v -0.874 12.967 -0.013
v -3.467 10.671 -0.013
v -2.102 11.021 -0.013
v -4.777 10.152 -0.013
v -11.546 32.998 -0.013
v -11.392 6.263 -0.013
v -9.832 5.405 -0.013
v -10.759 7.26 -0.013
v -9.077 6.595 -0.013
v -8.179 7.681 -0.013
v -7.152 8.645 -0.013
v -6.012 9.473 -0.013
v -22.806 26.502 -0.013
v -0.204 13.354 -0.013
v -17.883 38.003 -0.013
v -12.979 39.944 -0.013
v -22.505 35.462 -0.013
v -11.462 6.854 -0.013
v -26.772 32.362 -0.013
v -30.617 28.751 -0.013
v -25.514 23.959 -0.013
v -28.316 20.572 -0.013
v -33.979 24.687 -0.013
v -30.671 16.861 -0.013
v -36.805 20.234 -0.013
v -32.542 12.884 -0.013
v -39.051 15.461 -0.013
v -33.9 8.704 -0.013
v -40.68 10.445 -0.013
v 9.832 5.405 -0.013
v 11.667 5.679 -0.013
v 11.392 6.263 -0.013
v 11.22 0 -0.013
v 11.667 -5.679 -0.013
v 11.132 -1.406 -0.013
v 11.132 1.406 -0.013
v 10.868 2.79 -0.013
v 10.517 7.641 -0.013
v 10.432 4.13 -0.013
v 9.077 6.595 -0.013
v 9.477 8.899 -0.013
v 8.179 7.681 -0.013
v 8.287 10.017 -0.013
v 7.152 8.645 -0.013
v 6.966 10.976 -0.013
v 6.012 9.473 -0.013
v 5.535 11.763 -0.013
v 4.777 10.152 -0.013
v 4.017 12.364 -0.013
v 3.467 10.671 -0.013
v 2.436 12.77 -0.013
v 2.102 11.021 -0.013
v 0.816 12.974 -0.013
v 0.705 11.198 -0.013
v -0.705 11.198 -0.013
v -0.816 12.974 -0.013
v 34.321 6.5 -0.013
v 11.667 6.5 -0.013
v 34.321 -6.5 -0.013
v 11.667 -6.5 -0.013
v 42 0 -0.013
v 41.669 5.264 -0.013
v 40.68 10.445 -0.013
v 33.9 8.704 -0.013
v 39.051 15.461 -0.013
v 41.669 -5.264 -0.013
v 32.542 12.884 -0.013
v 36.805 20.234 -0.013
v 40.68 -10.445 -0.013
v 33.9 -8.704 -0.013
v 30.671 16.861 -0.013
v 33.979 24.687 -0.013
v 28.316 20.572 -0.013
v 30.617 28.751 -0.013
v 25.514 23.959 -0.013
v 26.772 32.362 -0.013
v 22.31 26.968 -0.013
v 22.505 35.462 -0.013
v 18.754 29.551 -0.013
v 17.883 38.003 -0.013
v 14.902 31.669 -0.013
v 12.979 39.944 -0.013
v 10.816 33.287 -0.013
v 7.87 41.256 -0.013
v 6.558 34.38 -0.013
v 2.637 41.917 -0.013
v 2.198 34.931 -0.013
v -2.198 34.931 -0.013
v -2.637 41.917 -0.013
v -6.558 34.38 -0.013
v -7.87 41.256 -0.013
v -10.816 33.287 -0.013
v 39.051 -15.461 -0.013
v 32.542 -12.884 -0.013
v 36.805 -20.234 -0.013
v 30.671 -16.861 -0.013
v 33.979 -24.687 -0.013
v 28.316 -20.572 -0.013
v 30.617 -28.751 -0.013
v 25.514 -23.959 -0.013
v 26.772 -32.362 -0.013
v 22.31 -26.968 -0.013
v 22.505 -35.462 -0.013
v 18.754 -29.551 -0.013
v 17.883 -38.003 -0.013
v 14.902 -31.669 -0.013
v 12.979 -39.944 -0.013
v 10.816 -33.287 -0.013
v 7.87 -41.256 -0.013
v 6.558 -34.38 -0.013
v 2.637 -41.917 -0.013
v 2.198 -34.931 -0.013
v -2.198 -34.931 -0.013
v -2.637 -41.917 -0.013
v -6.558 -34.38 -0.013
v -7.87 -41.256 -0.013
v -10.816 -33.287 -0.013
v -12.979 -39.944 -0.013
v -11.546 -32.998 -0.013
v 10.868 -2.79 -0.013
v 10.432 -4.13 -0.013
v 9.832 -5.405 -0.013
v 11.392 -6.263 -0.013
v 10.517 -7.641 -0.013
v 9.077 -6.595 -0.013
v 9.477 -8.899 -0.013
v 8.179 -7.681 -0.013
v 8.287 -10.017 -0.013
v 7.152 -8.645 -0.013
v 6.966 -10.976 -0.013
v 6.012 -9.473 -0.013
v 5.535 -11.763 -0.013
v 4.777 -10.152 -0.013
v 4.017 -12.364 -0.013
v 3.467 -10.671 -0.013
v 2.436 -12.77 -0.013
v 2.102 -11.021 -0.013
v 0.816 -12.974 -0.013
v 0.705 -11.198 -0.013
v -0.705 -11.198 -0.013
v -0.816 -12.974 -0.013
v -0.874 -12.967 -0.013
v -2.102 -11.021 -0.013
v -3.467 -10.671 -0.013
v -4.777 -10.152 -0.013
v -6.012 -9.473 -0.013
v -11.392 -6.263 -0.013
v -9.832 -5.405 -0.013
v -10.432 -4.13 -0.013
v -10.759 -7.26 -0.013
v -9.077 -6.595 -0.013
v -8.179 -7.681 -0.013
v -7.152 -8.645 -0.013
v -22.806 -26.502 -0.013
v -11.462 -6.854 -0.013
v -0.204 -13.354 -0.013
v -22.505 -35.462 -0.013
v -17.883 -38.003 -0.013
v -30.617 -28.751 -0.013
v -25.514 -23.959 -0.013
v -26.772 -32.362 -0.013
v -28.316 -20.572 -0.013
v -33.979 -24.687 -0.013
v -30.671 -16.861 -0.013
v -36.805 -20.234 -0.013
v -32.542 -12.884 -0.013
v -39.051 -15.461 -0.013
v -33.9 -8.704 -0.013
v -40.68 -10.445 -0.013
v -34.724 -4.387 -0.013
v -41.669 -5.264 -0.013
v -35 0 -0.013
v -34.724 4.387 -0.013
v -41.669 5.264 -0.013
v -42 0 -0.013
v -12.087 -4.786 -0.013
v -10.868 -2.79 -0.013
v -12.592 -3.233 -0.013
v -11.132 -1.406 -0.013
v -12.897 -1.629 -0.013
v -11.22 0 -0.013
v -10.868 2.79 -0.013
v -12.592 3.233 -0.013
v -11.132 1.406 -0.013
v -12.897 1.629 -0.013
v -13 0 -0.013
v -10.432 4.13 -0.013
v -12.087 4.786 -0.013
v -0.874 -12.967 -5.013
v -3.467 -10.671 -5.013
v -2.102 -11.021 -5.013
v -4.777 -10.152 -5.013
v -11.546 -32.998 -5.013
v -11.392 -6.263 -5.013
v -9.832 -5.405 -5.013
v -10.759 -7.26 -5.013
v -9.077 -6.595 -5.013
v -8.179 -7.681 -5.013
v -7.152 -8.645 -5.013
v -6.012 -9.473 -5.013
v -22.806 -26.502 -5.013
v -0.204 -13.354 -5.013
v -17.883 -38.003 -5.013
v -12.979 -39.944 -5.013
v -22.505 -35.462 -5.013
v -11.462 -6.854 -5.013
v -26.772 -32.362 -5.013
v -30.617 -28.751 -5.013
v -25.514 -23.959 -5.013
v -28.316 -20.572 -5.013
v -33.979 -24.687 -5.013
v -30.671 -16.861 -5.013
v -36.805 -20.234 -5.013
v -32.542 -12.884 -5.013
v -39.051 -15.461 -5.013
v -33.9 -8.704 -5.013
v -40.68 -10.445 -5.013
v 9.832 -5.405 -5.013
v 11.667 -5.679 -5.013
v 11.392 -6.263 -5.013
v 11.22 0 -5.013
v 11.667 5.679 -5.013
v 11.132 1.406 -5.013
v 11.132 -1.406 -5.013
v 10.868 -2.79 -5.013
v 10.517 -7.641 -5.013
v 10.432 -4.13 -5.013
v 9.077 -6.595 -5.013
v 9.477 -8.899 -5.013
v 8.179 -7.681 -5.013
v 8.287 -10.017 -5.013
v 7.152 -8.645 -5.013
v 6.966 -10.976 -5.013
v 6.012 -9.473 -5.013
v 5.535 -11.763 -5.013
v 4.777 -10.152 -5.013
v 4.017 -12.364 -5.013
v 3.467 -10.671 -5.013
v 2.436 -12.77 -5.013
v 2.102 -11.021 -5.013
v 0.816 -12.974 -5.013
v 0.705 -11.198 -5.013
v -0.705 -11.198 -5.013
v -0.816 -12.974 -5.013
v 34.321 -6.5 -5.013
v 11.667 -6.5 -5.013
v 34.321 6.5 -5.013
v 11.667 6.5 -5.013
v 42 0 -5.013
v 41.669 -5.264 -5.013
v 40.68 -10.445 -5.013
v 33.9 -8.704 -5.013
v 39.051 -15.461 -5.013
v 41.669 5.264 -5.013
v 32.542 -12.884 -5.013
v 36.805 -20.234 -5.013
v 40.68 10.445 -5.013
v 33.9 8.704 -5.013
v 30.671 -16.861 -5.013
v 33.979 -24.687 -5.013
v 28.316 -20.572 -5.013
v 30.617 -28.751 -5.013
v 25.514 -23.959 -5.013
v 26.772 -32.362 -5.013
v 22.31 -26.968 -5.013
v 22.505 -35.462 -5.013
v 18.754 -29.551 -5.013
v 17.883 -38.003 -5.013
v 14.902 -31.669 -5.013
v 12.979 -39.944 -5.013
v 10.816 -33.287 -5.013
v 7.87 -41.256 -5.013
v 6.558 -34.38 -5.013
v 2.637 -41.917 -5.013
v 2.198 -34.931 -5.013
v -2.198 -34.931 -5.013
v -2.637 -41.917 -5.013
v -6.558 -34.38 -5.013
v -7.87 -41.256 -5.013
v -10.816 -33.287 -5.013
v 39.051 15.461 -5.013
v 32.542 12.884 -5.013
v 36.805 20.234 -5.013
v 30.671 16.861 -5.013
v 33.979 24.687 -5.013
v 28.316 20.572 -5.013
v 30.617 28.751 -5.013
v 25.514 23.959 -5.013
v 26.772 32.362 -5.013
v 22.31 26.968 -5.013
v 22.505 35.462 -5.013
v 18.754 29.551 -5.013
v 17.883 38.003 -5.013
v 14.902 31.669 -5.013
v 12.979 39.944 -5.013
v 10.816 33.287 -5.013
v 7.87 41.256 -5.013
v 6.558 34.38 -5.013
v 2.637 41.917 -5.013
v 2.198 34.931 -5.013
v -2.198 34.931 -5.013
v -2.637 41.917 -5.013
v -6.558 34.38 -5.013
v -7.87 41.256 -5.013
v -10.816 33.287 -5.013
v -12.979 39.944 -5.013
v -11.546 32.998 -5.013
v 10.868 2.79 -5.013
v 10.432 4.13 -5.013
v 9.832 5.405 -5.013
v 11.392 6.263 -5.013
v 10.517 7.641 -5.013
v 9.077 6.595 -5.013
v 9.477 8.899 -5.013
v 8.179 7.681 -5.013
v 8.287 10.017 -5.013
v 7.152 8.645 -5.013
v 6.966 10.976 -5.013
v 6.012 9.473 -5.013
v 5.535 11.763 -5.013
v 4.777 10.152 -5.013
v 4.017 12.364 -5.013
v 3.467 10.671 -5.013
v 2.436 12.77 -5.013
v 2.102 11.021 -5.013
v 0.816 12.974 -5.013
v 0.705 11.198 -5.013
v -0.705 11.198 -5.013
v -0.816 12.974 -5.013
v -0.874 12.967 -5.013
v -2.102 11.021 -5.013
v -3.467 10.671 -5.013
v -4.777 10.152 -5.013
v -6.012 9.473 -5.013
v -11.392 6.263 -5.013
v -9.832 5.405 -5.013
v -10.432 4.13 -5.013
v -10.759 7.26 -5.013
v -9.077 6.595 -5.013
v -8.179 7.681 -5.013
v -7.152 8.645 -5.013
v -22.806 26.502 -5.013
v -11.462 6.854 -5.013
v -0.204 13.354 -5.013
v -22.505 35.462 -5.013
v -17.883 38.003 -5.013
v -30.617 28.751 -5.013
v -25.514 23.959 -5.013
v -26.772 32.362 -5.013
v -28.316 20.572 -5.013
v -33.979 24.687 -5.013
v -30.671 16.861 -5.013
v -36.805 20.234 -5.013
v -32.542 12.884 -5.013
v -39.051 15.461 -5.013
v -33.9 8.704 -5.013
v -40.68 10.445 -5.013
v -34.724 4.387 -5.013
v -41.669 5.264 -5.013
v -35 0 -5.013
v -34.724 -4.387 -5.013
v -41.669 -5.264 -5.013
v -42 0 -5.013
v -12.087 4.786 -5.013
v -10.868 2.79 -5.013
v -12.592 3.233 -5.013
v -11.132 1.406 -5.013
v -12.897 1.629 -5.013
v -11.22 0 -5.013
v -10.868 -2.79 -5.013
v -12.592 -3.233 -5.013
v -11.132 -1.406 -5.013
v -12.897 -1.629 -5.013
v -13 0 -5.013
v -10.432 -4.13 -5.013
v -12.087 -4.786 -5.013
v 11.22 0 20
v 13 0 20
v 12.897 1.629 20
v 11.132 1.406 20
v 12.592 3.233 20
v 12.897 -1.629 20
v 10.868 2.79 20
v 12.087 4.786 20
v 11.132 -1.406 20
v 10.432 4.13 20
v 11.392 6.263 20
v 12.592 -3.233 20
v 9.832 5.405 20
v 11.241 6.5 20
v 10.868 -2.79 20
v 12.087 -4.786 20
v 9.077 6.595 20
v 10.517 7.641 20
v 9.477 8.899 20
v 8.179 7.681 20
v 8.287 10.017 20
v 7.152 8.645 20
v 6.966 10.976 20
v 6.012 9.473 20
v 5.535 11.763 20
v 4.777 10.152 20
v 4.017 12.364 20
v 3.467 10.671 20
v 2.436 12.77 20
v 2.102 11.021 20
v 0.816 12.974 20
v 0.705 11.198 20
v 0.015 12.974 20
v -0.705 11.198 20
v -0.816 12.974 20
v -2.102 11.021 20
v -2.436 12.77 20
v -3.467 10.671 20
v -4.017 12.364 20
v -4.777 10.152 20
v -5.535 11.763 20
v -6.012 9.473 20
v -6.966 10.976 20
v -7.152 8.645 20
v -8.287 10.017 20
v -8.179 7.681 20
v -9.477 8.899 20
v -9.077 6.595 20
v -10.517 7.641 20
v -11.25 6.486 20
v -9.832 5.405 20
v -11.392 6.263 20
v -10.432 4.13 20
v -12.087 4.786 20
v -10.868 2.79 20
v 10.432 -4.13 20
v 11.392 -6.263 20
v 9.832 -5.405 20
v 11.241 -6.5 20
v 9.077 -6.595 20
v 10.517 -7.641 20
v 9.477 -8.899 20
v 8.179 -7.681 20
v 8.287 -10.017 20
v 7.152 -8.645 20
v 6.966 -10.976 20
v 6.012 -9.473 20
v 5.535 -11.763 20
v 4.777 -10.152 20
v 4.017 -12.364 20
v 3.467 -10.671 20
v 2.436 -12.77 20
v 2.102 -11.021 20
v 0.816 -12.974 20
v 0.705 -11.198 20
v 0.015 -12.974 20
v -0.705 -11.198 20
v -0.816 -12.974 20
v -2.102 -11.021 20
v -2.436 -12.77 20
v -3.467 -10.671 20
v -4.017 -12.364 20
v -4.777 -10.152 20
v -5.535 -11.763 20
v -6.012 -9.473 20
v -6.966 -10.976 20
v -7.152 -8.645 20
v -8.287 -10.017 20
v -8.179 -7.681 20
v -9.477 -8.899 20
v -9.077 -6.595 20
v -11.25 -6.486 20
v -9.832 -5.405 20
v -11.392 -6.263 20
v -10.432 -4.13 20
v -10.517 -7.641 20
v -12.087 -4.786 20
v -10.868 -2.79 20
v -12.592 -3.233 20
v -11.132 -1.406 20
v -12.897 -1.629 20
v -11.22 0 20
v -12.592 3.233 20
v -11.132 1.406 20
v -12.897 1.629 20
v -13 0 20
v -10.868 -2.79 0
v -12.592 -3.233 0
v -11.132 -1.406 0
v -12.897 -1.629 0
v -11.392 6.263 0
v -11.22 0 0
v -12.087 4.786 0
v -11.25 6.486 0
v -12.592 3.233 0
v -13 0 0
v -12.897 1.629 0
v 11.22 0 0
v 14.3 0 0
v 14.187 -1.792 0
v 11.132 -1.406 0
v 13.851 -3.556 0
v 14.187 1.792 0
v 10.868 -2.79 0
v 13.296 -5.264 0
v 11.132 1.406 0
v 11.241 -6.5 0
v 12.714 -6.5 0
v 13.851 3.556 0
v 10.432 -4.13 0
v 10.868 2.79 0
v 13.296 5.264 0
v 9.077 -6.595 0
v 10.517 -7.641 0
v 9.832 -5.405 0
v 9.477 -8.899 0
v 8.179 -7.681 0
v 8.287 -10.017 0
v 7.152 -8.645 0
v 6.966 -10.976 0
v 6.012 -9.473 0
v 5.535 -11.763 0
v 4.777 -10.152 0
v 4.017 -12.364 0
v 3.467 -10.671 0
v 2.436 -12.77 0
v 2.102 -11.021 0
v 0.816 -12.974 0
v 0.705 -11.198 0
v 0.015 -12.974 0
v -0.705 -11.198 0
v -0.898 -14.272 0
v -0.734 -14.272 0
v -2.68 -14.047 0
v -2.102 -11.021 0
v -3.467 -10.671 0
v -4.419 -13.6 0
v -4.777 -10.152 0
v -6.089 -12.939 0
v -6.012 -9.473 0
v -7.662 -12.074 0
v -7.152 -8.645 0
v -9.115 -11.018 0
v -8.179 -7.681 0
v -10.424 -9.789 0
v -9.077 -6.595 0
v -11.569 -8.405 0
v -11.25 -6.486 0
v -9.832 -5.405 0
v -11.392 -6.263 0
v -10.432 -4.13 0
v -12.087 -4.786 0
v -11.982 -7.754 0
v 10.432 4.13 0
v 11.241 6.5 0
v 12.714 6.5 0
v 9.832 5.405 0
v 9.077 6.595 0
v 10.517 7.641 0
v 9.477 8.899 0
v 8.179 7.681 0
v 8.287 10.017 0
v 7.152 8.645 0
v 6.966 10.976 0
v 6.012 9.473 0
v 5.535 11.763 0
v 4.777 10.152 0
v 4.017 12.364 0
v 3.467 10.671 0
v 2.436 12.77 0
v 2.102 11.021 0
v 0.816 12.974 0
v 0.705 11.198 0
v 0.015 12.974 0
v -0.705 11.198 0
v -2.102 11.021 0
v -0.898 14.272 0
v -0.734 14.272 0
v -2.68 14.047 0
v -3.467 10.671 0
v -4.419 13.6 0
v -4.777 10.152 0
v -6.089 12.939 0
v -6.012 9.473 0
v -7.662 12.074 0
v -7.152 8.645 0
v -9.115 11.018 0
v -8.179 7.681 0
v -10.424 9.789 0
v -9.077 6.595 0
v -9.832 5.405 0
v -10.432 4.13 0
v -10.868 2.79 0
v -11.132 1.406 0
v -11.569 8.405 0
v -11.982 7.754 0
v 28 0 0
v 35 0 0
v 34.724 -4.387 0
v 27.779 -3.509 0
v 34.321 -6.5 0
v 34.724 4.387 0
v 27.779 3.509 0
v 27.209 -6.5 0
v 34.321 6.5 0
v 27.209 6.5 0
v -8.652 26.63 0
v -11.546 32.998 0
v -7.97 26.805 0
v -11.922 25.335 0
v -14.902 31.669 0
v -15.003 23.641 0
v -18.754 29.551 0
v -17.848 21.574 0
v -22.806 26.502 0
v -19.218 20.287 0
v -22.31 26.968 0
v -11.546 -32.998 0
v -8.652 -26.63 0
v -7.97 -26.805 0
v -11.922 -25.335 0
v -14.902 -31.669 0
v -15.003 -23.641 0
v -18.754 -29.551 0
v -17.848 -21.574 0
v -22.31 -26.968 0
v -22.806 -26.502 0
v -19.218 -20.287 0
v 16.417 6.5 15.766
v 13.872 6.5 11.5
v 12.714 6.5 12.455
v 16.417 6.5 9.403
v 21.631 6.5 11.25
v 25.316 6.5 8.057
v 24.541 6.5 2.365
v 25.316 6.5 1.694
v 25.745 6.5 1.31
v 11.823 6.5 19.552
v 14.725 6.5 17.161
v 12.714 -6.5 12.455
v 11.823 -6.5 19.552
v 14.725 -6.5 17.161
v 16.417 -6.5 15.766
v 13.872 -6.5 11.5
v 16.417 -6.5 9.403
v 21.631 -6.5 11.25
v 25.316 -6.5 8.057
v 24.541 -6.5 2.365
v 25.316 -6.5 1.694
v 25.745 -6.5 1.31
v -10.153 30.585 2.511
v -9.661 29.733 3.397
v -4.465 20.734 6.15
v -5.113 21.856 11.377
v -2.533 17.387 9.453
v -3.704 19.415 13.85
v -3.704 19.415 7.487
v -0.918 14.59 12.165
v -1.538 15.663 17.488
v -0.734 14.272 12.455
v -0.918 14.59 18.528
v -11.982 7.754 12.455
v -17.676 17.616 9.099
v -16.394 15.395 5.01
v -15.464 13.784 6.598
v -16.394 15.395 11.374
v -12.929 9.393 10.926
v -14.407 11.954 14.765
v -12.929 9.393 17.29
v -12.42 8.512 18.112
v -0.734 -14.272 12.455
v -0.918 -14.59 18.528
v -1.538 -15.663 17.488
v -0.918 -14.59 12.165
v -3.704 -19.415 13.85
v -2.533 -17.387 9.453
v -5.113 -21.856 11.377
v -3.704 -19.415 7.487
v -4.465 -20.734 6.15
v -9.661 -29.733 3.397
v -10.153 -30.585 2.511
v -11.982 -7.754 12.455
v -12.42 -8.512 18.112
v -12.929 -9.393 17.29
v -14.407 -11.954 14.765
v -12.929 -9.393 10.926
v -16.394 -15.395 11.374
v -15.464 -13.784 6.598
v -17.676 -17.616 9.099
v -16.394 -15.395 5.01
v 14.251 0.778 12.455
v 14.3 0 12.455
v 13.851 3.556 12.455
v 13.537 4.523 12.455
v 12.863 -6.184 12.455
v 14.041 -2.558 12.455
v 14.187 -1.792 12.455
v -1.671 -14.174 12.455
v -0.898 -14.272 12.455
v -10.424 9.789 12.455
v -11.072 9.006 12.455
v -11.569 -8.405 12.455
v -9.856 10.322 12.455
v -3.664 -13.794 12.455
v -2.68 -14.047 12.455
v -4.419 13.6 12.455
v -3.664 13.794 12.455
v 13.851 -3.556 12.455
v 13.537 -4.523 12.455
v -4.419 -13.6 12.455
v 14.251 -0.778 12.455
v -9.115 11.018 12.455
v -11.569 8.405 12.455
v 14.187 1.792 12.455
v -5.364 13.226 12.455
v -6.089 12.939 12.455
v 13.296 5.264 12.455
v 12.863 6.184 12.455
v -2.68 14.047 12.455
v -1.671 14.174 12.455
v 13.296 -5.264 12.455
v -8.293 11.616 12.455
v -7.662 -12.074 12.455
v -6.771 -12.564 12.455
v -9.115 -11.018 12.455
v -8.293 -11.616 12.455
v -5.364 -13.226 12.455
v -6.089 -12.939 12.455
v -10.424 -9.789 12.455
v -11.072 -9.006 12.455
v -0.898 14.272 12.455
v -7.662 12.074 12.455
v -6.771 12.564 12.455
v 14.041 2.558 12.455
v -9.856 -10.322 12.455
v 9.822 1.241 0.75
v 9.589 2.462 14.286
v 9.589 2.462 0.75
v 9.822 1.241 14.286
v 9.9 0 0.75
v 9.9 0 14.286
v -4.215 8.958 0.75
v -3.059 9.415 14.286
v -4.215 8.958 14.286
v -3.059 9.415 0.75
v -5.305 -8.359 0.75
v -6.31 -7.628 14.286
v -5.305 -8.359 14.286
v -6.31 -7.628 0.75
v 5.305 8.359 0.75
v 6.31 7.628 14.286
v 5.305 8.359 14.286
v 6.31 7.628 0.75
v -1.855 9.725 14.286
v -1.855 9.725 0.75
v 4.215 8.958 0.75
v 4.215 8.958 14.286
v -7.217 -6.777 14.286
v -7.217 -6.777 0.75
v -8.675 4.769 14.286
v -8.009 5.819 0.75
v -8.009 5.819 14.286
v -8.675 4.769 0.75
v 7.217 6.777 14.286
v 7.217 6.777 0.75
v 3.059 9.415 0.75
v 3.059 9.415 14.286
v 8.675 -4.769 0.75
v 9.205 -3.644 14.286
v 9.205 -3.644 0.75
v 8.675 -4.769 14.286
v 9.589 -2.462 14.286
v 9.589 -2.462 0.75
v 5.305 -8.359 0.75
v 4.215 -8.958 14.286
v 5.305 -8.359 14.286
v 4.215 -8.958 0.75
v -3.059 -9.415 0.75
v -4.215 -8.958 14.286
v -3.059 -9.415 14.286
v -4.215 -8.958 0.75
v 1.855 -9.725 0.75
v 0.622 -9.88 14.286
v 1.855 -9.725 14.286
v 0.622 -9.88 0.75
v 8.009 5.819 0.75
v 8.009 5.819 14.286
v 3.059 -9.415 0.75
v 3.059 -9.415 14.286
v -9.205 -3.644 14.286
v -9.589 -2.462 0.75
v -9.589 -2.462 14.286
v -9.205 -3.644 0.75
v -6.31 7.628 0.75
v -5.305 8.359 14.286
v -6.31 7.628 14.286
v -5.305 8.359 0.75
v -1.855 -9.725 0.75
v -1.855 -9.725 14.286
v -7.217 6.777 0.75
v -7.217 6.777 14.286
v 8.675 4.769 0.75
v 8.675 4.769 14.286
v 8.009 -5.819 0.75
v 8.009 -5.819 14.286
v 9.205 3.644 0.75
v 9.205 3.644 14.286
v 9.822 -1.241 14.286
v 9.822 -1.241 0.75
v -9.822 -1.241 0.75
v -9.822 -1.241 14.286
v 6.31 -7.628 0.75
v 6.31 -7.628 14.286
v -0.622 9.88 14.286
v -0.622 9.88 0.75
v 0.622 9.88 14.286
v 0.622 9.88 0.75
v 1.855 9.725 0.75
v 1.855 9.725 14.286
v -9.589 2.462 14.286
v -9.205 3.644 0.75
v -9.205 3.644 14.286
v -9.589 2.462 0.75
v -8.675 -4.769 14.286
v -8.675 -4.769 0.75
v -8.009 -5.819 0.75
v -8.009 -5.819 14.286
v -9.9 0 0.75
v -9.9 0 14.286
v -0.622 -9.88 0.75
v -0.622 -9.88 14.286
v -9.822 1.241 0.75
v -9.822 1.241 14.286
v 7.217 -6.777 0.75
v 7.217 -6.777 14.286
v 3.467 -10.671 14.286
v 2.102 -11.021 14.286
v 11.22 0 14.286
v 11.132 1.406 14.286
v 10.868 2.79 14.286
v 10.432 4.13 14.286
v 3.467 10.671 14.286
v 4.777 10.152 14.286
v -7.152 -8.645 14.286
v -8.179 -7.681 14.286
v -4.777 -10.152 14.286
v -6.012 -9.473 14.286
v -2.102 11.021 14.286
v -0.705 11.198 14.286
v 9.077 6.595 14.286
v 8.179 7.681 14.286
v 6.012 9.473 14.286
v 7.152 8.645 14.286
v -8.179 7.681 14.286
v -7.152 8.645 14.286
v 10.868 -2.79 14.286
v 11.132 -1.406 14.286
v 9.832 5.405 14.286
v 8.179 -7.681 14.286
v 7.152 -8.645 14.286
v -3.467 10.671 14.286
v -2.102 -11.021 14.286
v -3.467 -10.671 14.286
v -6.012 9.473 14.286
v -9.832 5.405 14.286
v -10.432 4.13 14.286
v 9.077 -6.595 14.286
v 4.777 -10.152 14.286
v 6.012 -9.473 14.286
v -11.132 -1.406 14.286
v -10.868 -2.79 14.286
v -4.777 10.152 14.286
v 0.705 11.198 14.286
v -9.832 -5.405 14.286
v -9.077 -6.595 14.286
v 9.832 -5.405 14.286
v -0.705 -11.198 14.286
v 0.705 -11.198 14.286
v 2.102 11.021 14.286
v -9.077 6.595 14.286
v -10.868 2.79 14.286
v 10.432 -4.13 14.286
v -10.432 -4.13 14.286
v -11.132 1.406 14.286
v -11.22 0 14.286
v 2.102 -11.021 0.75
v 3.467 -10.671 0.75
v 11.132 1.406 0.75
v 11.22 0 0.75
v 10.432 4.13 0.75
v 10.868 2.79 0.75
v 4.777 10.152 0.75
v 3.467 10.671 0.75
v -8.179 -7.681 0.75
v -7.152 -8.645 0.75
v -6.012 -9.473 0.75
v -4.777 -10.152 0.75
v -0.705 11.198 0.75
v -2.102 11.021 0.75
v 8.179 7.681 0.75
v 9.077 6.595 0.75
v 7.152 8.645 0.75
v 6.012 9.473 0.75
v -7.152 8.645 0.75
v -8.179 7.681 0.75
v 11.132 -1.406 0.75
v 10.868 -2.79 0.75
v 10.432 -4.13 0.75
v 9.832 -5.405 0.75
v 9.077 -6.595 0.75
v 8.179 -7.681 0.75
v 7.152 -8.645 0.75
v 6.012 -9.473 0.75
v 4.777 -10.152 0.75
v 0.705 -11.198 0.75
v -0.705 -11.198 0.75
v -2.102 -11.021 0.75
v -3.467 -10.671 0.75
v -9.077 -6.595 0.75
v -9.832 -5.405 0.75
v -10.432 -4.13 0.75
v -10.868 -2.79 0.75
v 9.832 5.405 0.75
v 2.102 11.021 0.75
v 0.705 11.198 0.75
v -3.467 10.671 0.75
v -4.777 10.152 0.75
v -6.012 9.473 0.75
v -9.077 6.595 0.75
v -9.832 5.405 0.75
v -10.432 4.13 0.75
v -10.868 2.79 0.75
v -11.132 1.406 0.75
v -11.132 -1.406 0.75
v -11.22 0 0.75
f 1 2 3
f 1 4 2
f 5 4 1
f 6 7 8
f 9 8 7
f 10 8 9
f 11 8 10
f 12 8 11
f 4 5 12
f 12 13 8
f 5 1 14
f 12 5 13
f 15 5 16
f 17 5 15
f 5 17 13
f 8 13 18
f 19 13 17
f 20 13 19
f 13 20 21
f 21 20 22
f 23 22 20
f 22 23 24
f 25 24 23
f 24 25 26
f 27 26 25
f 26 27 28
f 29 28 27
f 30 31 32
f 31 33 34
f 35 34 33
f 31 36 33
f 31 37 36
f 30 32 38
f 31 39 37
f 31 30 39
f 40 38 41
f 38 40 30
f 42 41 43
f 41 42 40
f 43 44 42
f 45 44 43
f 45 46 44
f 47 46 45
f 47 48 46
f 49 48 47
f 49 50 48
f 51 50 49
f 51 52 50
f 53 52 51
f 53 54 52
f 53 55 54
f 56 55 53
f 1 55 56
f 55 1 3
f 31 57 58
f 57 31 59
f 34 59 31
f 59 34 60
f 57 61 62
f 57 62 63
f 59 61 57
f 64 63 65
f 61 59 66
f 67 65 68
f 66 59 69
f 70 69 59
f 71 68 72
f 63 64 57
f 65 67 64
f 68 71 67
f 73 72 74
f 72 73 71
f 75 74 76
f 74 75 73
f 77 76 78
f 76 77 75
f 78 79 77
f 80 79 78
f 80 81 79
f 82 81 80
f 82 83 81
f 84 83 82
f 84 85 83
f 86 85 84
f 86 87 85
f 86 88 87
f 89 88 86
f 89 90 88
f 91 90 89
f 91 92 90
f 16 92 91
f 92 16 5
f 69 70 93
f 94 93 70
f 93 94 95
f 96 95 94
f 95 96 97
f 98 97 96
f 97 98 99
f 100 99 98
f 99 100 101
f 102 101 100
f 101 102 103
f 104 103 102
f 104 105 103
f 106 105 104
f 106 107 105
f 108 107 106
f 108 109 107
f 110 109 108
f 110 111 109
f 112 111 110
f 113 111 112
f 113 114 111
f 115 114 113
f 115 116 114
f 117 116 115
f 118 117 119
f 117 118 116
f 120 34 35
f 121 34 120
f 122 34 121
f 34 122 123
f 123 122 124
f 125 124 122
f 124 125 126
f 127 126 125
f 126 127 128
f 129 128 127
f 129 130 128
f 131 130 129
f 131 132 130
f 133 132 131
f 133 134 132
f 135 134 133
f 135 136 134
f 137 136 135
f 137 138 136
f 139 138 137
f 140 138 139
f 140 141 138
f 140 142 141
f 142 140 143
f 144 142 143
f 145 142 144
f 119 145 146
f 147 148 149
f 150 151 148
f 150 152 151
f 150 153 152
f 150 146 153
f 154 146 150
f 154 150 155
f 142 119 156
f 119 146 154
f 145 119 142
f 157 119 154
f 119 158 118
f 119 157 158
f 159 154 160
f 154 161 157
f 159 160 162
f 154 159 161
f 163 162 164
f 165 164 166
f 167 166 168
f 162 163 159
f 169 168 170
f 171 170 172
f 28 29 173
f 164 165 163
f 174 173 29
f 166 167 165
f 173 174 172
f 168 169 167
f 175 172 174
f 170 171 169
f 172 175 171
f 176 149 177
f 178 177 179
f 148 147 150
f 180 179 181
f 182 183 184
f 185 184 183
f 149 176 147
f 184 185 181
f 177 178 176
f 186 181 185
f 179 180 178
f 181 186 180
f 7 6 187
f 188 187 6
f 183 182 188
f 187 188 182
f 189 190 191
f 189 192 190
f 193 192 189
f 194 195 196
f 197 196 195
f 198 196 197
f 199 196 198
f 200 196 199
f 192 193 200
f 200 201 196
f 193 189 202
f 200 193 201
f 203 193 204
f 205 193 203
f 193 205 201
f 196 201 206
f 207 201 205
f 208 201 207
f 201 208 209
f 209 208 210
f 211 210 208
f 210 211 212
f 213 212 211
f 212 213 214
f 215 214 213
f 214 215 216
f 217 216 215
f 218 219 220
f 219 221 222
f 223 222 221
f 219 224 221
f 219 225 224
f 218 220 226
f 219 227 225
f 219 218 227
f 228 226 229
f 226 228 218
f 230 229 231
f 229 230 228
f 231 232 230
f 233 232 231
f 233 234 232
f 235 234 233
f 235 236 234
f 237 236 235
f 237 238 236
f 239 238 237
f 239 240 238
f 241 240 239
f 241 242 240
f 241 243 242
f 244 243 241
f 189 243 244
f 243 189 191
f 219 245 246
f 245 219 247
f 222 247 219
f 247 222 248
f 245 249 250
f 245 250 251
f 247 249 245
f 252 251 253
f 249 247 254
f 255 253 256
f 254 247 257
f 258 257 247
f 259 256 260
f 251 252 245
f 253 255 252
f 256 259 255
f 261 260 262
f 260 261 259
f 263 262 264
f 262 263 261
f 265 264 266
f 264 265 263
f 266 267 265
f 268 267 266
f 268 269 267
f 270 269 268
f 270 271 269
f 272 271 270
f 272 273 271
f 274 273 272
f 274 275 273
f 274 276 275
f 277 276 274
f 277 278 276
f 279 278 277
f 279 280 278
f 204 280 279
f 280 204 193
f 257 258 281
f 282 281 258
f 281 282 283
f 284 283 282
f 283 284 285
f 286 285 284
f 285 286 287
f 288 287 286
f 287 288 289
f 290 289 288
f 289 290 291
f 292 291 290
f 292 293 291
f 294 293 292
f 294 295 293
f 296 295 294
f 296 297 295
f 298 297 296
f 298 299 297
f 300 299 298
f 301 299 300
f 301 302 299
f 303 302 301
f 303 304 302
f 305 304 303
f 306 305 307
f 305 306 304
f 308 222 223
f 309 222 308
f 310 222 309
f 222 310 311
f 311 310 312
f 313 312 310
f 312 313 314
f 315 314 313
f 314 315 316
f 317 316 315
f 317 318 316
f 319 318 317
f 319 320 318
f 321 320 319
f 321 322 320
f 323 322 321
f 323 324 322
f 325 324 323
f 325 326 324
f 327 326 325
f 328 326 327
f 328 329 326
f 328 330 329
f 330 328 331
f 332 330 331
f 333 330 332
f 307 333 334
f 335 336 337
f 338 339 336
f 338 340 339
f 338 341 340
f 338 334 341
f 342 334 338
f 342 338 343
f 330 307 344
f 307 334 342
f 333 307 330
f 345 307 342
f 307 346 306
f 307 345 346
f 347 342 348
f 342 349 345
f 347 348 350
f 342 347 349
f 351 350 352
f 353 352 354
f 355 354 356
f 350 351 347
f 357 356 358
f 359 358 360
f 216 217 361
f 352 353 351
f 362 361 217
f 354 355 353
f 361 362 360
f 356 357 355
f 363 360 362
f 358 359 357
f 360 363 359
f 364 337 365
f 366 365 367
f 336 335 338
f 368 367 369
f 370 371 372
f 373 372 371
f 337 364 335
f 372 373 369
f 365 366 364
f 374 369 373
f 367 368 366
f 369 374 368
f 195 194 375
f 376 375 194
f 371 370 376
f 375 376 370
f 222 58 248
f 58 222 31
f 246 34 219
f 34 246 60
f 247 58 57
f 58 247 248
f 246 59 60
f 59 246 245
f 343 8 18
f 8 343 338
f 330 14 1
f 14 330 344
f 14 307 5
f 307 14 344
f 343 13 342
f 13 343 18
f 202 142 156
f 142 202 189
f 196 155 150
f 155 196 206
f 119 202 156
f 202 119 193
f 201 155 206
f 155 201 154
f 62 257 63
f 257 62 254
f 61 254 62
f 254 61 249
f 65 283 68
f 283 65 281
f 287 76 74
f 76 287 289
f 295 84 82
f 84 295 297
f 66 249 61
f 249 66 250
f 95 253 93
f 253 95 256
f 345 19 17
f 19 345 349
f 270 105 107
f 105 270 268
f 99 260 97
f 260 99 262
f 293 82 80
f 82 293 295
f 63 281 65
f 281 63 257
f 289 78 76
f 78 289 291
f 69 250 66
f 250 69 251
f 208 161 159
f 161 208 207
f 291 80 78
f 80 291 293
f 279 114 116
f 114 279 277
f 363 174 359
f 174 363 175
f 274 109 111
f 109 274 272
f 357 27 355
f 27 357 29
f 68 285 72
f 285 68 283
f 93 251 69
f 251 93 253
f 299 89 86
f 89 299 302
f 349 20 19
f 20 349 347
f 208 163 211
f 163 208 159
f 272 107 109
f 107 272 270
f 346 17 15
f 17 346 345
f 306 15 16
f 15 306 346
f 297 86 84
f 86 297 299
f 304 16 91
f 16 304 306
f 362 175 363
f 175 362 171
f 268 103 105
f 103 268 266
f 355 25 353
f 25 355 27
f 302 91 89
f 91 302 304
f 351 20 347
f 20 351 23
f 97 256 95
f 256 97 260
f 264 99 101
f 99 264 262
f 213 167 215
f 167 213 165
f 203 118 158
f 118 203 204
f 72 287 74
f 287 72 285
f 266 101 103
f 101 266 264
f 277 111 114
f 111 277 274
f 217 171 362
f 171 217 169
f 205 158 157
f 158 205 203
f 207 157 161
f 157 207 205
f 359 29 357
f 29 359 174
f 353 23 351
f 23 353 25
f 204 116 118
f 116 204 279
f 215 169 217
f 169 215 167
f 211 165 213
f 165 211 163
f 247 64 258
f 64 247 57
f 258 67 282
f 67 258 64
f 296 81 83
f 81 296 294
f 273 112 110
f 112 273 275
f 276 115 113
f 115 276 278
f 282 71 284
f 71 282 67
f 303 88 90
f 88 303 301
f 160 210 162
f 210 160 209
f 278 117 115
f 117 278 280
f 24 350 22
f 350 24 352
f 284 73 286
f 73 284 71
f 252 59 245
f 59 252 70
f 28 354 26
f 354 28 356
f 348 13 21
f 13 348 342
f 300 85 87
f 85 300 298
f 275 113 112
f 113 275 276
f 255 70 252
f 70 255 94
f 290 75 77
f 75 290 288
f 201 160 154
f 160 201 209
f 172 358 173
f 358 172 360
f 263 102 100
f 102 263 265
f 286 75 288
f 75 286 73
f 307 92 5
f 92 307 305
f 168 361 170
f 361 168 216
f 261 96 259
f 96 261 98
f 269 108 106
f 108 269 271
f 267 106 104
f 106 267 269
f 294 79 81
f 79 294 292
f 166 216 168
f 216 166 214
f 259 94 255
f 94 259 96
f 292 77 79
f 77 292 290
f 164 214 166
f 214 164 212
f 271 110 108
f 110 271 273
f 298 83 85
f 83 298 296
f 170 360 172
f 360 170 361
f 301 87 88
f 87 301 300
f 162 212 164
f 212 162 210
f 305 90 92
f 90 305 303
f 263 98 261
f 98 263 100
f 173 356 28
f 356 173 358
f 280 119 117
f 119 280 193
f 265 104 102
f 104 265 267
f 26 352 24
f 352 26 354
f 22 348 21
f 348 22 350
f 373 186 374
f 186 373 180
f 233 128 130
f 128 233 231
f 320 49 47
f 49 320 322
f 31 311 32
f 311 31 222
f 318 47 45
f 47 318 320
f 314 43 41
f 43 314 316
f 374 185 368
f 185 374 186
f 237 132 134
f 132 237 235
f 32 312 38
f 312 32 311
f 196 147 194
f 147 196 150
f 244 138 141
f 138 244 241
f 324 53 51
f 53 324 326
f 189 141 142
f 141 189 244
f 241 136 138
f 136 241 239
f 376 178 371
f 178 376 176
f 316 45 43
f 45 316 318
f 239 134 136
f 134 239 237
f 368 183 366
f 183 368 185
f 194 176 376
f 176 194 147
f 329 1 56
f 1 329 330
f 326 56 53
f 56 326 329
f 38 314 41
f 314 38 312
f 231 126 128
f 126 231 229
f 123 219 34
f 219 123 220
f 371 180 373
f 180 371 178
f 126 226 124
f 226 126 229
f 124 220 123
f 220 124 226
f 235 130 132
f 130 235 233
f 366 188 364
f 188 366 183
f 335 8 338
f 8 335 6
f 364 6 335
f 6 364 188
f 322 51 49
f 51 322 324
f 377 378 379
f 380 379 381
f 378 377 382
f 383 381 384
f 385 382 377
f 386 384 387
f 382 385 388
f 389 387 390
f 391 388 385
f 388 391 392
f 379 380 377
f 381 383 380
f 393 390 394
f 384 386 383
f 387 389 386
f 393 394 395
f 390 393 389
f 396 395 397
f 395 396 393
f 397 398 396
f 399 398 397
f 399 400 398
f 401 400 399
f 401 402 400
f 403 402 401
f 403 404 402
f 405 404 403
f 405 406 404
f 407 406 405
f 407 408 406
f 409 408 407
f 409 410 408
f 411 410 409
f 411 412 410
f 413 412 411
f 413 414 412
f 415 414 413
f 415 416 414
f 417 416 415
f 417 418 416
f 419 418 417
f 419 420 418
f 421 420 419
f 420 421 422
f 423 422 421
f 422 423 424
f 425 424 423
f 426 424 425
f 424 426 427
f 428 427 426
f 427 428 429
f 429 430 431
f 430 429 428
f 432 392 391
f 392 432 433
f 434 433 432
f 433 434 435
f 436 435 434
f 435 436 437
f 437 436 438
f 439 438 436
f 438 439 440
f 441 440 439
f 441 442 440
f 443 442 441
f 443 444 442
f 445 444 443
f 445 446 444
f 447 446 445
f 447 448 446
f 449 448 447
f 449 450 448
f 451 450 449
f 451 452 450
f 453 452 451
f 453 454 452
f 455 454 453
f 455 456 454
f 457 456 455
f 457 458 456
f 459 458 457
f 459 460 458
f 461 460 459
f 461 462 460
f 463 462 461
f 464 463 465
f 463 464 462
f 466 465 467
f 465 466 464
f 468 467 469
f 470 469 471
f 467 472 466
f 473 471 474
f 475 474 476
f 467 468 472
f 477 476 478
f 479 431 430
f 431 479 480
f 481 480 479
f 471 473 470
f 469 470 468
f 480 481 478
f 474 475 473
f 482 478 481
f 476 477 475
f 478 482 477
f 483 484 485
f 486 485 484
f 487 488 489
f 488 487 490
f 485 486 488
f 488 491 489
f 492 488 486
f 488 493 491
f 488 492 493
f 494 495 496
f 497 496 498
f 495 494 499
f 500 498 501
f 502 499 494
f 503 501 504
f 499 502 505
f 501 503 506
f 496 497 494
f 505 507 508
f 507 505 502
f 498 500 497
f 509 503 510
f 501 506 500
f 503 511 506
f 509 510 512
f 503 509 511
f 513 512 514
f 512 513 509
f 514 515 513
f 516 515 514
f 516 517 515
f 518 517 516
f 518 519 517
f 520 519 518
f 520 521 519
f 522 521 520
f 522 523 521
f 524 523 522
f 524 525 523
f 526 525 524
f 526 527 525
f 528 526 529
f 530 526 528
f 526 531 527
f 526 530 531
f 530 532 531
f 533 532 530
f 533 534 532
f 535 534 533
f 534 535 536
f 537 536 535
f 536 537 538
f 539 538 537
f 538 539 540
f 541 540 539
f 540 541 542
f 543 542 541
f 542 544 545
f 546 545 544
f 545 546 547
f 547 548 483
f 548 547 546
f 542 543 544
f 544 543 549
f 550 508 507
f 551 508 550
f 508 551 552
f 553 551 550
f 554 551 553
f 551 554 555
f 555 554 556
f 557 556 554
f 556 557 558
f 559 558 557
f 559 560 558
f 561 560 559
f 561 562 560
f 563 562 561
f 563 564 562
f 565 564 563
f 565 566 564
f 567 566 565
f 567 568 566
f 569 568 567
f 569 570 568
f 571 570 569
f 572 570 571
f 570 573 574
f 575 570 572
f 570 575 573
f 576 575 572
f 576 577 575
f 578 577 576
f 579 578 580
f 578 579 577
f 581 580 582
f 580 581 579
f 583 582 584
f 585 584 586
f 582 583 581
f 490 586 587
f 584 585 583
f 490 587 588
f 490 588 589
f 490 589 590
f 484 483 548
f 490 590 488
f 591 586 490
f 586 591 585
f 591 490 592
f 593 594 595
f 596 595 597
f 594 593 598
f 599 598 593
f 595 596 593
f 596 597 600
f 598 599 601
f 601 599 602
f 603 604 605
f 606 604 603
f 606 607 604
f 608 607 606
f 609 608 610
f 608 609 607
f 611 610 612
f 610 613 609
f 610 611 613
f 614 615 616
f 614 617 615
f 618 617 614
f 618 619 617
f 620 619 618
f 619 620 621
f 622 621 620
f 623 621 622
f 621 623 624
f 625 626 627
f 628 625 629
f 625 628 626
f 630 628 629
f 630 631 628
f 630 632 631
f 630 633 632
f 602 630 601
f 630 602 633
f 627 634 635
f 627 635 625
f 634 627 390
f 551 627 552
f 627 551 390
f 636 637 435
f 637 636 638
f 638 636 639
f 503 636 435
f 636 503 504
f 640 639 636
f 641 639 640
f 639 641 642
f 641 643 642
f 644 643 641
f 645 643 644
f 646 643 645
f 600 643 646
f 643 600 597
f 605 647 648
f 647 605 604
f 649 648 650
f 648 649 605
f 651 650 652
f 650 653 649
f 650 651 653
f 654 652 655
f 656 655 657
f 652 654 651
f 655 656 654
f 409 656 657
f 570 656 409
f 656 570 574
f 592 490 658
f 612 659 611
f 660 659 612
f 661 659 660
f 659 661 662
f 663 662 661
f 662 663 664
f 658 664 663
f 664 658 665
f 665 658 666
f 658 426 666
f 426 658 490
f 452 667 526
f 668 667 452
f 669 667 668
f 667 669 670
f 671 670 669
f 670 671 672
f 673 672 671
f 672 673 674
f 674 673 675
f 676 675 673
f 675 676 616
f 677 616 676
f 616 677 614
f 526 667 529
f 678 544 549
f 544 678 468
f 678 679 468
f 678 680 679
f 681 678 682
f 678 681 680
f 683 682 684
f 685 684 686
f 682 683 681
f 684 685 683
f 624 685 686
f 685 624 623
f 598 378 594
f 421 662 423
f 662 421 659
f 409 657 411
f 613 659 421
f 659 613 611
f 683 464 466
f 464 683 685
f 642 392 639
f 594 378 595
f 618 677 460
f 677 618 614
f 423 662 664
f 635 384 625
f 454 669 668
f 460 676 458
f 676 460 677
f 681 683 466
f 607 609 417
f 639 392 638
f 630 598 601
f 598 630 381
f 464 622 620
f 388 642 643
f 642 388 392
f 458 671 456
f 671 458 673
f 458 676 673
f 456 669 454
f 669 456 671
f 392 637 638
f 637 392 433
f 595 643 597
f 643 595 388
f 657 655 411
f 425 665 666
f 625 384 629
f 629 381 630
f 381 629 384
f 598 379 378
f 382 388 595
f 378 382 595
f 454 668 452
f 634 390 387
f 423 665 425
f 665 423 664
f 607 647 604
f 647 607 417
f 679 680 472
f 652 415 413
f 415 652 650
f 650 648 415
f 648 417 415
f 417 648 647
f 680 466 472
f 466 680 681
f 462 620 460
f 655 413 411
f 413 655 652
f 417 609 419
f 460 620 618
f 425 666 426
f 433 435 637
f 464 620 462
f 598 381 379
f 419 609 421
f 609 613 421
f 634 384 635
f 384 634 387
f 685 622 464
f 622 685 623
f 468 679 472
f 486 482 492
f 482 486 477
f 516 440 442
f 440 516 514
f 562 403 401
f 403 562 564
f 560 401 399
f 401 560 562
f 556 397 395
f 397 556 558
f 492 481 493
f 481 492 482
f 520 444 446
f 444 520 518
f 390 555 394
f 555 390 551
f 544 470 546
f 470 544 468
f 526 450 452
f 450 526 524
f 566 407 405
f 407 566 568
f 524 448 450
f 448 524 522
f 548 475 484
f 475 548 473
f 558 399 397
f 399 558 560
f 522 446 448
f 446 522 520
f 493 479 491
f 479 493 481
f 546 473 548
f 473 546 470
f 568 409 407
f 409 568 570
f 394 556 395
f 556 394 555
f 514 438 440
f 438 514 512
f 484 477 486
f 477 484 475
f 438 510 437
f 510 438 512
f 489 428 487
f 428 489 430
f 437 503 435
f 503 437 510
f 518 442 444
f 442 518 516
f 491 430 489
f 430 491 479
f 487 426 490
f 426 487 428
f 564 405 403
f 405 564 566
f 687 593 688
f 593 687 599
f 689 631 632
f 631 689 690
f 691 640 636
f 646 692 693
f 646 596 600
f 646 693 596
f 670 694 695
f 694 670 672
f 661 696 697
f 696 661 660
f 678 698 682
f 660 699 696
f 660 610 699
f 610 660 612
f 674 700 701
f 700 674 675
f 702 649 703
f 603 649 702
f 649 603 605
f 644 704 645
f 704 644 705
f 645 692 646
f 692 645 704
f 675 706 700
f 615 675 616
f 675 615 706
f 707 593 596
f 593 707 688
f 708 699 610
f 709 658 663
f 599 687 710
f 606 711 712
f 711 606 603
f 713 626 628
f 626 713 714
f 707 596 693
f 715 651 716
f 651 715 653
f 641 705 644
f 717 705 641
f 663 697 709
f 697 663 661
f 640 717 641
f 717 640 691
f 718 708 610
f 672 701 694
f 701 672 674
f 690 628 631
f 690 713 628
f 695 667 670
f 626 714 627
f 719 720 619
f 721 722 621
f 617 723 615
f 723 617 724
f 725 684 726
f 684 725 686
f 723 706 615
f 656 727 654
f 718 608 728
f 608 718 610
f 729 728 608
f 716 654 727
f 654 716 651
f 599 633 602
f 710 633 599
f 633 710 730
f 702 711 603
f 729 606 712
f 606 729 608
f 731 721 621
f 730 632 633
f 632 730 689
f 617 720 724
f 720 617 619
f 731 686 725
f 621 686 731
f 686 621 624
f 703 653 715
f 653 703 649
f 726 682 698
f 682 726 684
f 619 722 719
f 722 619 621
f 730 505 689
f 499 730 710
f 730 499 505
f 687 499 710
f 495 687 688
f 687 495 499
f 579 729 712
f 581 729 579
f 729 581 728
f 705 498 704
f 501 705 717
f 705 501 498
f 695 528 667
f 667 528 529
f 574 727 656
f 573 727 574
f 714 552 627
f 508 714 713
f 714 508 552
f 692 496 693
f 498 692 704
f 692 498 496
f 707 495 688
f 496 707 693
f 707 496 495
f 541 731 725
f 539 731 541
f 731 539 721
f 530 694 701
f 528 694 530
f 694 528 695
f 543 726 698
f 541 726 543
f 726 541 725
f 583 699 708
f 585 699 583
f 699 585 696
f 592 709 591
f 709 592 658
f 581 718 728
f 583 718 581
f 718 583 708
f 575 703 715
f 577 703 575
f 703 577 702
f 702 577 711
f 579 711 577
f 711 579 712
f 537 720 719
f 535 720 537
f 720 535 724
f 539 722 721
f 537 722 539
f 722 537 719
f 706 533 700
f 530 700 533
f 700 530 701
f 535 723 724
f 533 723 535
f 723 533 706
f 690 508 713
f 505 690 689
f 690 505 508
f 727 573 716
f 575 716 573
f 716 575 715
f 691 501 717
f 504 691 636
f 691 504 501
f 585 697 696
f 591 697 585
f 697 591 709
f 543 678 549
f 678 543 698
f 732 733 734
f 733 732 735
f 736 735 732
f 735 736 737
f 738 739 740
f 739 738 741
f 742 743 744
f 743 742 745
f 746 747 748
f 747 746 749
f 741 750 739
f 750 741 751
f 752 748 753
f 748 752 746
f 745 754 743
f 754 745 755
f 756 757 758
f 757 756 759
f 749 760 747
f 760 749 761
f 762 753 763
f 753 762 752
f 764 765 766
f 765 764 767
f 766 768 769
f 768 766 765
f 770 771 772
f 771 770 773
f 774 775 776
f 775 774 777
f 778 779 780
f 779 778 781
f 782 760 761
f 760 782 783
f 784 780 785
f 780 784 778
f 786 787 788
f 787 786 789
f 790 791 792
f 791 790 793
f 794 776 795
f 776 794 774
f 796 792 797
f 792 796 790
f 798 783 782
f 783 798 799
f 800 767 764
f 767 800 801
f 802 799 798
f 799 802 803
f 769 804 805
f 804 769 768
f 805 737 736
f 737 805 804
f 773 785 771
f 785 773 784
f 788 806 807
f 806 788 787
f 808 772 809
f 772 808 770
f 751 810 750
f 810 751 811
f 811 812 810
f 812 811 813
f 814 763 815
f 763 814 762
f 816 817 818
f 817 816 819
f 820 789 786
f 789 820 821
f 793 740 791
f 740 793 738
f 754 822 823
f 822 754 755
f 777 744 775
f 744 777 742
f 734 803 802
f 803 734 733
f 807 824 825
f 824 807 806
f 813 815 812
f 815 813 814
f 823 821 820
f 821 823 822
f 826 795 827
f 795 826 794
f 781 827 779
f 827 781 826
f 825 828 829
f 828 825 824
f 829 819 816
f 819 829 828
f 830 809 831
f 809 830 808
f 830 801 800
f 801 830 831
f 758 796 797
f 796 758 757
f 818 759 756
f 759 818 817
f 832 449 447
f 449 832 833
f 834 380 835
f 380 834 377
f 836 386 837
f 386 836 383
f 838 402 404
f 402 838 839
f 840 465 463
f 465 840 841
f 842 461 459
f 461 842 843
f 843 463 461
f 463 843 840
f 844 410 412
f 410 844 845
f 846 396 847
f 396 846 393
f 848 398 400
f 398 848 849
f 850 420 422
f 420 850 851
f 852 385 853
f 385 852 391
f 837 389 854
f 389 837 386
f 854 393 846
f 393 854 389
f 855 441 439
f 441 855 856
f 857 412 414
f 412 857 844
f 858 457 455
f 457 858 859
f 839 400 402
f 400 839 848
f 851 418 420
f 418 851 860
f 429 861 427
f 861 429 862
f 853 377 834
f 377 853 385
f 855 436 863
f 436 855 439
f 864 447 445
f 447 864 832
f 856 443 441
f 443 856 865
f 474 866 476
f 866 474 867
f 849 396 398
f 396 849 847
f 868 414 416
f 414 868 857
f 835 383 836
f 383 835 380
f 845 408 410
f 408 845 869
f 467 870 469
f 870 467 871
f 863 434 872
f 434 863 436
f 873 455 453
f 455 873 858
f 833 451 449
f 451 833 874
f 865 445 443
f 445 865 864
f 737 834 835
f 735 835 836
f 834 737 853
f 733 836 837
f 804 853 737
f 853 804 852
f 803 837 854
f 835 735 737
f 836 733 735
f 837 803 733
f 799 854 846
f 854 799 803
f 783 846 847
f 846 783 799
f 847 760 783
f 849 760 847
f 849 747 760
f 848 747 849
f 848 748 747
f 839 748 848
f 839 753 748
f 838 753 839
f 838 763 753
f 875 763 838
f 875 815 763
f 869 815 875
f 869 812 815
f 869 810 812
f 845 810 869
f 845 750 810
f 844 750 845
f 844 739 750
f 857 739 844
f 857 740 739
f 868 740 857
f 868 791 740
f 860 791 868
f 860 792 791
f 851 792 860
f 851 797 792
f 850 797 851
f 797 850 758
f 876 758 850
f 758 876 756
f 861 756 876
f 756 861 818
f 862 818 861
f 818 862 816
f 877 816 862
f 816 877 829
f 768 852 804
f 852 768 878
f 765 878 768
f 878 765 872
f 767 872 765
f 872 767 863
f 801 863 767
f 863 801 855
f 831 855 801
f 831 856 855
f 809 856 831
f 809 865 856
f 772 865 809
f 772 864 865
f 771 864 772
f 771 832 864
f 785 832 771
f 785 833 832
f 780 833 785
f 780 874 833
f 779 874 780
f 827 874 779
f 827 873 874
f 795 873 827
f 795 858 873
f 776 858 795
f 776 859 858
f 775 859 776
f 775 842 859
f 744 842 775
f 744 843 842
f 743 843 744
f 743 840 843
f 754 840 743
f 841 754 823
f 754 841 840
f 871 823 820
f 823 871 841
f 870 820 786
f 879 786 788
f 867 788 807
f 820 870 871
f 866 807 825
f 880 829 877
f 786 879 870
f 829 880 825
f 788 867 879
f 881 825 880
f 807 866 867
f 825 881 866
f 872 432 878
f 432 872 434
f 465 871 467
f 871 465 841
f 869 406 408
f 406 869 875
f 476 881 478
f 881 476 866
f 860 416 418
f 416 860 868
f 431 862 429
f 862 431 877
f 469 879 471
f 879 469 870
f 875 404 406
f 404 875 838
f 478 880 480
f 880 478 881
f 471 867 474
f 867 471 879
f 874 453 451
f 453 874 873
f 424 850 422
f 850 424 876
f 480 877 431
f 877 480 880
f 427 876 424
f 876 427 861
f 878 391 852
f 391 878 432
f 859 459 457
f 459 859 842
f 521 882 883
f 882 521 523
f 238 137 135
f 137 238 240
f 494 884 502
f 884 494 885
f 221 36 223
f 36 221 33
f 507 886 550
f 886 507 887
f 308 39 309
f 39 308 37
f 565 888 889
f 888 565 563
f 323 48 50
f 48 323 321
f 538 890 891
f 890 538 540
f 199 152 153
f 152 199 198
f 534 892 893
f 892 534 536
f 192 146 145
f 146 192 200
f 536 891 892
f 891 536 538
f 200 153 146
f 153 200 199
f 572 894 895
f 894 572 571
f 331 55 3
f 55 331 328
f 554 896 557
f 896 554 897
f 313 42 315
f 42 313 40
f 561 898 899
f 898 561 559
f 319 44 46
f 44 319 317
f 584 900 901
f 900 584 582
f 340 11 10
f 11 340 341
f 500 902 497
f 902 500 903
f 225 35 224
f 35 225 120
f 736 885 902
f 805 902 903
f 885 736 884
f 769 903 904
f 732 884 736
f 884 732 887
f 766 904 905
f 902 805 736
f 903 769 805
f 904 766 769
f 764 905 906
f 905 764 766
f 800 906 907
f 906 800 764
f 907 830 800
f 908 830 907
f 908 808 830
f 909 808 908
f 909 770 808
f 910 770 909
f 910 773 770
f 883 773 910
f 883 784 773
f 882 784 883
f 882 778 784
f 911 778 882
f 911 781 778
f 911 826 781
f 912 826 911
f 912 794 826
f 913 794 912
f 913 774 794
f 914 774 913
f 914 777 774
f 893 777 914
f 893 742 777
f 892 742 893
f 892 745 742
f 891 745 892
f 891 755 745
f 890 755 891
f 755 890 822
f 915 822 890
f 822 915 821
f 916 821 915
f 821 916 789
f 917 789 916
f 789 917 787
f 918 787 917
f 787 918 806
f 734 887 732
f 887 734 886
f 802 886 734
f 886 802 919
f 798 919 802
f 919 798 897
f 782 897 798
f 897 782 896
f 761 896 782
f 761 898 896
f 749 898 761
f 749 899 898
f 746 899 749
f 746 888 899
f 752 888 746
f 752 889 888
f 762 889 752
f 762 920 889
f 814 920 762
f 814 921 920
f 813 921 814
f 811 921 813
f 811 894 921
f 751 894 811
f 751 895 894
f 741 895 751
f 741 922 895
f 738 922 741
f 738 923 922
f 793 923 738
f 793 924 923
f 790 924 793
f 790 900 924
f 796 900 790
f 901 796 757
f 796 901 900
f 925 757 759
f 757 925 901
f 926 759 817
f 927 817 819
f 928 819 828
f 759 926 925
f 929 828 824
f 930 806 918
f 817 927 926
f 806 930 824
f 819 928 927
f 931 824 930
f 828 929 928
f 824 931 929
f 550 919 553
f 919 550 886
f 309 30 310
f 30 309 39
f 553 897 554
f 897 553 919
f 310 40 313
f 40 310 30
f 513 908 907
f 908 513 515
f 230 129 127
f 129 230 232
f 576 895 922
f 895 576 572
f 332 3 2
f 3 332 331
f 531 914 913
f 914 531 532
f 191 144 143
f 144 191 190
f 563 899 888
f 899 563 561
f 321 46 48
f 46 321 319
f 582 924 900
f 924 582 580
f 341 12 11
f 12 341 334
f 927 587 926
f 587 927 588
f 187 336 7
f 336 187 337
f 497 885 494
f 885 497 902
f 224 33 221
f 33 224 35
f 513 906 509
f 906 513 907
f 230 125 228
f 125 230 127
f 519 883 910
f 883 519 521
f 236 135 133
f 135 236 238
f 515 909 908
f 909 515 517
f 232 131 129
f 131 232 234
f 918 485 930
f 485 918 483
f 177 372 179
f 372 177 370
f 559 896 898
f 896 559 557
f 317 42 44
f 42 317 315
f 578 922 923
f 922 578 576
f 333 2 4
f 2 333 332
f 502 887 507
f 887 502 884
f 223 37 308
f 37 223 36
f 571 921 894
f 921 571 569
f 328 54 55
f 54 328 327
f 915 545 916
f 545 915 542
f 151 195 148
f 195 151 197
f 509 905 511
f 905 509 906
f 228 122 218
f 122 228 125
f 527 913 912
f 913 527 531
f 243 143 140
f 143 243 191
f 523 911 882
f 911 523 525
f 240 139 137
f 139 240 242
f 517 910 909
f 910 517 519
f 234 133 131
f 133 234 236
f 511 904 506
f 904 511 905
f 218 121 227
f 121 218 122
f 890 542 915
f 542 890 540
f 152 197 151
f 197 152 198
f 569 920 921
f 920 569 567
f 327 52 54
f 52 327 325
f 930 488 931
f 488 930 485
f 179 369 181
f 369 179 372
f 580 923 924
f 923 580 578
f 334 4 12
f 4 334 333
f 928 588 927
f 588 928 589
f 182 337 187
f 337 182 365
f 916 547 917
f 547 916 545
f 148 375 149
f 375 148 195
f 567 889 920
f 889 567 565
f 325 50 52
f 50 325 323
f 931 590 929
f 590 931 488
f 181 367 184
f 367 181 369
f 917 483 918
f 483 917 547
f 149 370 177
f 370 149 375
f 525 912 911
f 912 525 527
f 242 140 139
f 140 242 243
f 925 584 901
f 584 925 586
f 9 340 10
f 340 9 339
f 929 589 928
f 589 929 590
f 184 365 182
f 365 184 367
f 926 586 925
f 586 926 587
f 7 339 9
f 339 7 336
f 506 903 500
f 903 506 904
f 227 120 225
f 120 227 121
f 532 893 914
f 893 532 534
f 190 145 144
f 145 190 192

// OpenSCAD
/* [filament spool dimensions] */

// filament spool minimum diameter
min_diameter=26;

// filament spool minimum diameter
max_diameter=70;

/* [spindle dimensions] */

// width of spindle
spindle_width=20;

// width of spindle collar
collar_width=5;

/* [Hidden] */

//rod_diameter=5/16*24.5;
rod_diameter=spindle_width-2;

$fn=50;
include <MCAD/bearing.scad>;

module base(){
	union(){
		difference(){
			union(){
				rotate([0,0,0])translate([max_diameter/2,0,0])cube([max_diameter/1.5,0.5*min_diameter,collar_width],center=true);
				rotate([0,0,120])translate([max_diameter/2,0,0])cube([max_diameter/1.5,0.5*min_diameter,collar_width],center=true);
				rotate([0,0,-120])translate([max_diameter/2,0,0])cube([max_diameter/1.5,0.5*min_diameter,collar_width],center=true);
			}
			difference(){
				cylinder(d=2*max_diameter,h=1.1*collar_width,center=true);
				cylinder(d=1.1*max_diameter,h=1.2*collar_width,center=true);
			}
		}
		cylinder(d=min_diameter,h=collar_width,center=true);
		difference(){
			cylinder(d=1.2*max_diameter,h=collar_width,center=true);
			cylinder(d=1*max_diameter,h=1.2*collar_width,center=true);
		}
	}
}

module core(){
		union(){
			cylinder(d=min_diameter,h=spindle_width,center=true);
			intersection(){
				cylinder(d1=max_diameter,d2=min_diameter,h=spindle_width,center=true);
				union(){
					rotate([0,0,0])translate([max_diameter/2,0,0])cube([max_diameter,0.5*min_diameter,spindle_width],center=true);
					rotate([0,0,120])translate([max_diameter/2,0,0])cube([max_diameter,0.5*min_diameter,spindle_width],center=true);
					rotate([0,0,-120])translate([max_diameter/2,0,0])cube([max_diameter,0.5*min_diameter,spindle_width],center=true);
				}
			}
		}
}

module spindle(){
	difference(){
		union(){
			translate([0,0,-(collar_width)/1.99])base();
			translate([0,0,(spindle_width)/2]){
				difference(){
					core();
					translate([0,0,-0.1*spindle_width])difference(){
						cylinder(d1=0.8*max_diameter,d2=0.8*min_diameter,h=0.8*spindle_width,center=true);
						cylinder(d=1.1*min_diameter,h=0.9*spindle_width,center=true);
					}
				}
			}
		}
		translate([0,0,(spindle_width-collar_width)/2])cylinder(d=0.9*bearingOuterDiameter(SkateBearing),h=1.2*(spindle_width+collar_width),center=true);
	}
}

difference(){
	spindle();
	scale([1.02,1.02,1])bearing(pos=[0,0,(spindle_width)/1.4], model=SkateBearing, outline=true);
	scale([1.02,1.02,1])bearing(pos=[0,0,-(collar_width)/0.8], model=SkateBearing, outline=true);
}
